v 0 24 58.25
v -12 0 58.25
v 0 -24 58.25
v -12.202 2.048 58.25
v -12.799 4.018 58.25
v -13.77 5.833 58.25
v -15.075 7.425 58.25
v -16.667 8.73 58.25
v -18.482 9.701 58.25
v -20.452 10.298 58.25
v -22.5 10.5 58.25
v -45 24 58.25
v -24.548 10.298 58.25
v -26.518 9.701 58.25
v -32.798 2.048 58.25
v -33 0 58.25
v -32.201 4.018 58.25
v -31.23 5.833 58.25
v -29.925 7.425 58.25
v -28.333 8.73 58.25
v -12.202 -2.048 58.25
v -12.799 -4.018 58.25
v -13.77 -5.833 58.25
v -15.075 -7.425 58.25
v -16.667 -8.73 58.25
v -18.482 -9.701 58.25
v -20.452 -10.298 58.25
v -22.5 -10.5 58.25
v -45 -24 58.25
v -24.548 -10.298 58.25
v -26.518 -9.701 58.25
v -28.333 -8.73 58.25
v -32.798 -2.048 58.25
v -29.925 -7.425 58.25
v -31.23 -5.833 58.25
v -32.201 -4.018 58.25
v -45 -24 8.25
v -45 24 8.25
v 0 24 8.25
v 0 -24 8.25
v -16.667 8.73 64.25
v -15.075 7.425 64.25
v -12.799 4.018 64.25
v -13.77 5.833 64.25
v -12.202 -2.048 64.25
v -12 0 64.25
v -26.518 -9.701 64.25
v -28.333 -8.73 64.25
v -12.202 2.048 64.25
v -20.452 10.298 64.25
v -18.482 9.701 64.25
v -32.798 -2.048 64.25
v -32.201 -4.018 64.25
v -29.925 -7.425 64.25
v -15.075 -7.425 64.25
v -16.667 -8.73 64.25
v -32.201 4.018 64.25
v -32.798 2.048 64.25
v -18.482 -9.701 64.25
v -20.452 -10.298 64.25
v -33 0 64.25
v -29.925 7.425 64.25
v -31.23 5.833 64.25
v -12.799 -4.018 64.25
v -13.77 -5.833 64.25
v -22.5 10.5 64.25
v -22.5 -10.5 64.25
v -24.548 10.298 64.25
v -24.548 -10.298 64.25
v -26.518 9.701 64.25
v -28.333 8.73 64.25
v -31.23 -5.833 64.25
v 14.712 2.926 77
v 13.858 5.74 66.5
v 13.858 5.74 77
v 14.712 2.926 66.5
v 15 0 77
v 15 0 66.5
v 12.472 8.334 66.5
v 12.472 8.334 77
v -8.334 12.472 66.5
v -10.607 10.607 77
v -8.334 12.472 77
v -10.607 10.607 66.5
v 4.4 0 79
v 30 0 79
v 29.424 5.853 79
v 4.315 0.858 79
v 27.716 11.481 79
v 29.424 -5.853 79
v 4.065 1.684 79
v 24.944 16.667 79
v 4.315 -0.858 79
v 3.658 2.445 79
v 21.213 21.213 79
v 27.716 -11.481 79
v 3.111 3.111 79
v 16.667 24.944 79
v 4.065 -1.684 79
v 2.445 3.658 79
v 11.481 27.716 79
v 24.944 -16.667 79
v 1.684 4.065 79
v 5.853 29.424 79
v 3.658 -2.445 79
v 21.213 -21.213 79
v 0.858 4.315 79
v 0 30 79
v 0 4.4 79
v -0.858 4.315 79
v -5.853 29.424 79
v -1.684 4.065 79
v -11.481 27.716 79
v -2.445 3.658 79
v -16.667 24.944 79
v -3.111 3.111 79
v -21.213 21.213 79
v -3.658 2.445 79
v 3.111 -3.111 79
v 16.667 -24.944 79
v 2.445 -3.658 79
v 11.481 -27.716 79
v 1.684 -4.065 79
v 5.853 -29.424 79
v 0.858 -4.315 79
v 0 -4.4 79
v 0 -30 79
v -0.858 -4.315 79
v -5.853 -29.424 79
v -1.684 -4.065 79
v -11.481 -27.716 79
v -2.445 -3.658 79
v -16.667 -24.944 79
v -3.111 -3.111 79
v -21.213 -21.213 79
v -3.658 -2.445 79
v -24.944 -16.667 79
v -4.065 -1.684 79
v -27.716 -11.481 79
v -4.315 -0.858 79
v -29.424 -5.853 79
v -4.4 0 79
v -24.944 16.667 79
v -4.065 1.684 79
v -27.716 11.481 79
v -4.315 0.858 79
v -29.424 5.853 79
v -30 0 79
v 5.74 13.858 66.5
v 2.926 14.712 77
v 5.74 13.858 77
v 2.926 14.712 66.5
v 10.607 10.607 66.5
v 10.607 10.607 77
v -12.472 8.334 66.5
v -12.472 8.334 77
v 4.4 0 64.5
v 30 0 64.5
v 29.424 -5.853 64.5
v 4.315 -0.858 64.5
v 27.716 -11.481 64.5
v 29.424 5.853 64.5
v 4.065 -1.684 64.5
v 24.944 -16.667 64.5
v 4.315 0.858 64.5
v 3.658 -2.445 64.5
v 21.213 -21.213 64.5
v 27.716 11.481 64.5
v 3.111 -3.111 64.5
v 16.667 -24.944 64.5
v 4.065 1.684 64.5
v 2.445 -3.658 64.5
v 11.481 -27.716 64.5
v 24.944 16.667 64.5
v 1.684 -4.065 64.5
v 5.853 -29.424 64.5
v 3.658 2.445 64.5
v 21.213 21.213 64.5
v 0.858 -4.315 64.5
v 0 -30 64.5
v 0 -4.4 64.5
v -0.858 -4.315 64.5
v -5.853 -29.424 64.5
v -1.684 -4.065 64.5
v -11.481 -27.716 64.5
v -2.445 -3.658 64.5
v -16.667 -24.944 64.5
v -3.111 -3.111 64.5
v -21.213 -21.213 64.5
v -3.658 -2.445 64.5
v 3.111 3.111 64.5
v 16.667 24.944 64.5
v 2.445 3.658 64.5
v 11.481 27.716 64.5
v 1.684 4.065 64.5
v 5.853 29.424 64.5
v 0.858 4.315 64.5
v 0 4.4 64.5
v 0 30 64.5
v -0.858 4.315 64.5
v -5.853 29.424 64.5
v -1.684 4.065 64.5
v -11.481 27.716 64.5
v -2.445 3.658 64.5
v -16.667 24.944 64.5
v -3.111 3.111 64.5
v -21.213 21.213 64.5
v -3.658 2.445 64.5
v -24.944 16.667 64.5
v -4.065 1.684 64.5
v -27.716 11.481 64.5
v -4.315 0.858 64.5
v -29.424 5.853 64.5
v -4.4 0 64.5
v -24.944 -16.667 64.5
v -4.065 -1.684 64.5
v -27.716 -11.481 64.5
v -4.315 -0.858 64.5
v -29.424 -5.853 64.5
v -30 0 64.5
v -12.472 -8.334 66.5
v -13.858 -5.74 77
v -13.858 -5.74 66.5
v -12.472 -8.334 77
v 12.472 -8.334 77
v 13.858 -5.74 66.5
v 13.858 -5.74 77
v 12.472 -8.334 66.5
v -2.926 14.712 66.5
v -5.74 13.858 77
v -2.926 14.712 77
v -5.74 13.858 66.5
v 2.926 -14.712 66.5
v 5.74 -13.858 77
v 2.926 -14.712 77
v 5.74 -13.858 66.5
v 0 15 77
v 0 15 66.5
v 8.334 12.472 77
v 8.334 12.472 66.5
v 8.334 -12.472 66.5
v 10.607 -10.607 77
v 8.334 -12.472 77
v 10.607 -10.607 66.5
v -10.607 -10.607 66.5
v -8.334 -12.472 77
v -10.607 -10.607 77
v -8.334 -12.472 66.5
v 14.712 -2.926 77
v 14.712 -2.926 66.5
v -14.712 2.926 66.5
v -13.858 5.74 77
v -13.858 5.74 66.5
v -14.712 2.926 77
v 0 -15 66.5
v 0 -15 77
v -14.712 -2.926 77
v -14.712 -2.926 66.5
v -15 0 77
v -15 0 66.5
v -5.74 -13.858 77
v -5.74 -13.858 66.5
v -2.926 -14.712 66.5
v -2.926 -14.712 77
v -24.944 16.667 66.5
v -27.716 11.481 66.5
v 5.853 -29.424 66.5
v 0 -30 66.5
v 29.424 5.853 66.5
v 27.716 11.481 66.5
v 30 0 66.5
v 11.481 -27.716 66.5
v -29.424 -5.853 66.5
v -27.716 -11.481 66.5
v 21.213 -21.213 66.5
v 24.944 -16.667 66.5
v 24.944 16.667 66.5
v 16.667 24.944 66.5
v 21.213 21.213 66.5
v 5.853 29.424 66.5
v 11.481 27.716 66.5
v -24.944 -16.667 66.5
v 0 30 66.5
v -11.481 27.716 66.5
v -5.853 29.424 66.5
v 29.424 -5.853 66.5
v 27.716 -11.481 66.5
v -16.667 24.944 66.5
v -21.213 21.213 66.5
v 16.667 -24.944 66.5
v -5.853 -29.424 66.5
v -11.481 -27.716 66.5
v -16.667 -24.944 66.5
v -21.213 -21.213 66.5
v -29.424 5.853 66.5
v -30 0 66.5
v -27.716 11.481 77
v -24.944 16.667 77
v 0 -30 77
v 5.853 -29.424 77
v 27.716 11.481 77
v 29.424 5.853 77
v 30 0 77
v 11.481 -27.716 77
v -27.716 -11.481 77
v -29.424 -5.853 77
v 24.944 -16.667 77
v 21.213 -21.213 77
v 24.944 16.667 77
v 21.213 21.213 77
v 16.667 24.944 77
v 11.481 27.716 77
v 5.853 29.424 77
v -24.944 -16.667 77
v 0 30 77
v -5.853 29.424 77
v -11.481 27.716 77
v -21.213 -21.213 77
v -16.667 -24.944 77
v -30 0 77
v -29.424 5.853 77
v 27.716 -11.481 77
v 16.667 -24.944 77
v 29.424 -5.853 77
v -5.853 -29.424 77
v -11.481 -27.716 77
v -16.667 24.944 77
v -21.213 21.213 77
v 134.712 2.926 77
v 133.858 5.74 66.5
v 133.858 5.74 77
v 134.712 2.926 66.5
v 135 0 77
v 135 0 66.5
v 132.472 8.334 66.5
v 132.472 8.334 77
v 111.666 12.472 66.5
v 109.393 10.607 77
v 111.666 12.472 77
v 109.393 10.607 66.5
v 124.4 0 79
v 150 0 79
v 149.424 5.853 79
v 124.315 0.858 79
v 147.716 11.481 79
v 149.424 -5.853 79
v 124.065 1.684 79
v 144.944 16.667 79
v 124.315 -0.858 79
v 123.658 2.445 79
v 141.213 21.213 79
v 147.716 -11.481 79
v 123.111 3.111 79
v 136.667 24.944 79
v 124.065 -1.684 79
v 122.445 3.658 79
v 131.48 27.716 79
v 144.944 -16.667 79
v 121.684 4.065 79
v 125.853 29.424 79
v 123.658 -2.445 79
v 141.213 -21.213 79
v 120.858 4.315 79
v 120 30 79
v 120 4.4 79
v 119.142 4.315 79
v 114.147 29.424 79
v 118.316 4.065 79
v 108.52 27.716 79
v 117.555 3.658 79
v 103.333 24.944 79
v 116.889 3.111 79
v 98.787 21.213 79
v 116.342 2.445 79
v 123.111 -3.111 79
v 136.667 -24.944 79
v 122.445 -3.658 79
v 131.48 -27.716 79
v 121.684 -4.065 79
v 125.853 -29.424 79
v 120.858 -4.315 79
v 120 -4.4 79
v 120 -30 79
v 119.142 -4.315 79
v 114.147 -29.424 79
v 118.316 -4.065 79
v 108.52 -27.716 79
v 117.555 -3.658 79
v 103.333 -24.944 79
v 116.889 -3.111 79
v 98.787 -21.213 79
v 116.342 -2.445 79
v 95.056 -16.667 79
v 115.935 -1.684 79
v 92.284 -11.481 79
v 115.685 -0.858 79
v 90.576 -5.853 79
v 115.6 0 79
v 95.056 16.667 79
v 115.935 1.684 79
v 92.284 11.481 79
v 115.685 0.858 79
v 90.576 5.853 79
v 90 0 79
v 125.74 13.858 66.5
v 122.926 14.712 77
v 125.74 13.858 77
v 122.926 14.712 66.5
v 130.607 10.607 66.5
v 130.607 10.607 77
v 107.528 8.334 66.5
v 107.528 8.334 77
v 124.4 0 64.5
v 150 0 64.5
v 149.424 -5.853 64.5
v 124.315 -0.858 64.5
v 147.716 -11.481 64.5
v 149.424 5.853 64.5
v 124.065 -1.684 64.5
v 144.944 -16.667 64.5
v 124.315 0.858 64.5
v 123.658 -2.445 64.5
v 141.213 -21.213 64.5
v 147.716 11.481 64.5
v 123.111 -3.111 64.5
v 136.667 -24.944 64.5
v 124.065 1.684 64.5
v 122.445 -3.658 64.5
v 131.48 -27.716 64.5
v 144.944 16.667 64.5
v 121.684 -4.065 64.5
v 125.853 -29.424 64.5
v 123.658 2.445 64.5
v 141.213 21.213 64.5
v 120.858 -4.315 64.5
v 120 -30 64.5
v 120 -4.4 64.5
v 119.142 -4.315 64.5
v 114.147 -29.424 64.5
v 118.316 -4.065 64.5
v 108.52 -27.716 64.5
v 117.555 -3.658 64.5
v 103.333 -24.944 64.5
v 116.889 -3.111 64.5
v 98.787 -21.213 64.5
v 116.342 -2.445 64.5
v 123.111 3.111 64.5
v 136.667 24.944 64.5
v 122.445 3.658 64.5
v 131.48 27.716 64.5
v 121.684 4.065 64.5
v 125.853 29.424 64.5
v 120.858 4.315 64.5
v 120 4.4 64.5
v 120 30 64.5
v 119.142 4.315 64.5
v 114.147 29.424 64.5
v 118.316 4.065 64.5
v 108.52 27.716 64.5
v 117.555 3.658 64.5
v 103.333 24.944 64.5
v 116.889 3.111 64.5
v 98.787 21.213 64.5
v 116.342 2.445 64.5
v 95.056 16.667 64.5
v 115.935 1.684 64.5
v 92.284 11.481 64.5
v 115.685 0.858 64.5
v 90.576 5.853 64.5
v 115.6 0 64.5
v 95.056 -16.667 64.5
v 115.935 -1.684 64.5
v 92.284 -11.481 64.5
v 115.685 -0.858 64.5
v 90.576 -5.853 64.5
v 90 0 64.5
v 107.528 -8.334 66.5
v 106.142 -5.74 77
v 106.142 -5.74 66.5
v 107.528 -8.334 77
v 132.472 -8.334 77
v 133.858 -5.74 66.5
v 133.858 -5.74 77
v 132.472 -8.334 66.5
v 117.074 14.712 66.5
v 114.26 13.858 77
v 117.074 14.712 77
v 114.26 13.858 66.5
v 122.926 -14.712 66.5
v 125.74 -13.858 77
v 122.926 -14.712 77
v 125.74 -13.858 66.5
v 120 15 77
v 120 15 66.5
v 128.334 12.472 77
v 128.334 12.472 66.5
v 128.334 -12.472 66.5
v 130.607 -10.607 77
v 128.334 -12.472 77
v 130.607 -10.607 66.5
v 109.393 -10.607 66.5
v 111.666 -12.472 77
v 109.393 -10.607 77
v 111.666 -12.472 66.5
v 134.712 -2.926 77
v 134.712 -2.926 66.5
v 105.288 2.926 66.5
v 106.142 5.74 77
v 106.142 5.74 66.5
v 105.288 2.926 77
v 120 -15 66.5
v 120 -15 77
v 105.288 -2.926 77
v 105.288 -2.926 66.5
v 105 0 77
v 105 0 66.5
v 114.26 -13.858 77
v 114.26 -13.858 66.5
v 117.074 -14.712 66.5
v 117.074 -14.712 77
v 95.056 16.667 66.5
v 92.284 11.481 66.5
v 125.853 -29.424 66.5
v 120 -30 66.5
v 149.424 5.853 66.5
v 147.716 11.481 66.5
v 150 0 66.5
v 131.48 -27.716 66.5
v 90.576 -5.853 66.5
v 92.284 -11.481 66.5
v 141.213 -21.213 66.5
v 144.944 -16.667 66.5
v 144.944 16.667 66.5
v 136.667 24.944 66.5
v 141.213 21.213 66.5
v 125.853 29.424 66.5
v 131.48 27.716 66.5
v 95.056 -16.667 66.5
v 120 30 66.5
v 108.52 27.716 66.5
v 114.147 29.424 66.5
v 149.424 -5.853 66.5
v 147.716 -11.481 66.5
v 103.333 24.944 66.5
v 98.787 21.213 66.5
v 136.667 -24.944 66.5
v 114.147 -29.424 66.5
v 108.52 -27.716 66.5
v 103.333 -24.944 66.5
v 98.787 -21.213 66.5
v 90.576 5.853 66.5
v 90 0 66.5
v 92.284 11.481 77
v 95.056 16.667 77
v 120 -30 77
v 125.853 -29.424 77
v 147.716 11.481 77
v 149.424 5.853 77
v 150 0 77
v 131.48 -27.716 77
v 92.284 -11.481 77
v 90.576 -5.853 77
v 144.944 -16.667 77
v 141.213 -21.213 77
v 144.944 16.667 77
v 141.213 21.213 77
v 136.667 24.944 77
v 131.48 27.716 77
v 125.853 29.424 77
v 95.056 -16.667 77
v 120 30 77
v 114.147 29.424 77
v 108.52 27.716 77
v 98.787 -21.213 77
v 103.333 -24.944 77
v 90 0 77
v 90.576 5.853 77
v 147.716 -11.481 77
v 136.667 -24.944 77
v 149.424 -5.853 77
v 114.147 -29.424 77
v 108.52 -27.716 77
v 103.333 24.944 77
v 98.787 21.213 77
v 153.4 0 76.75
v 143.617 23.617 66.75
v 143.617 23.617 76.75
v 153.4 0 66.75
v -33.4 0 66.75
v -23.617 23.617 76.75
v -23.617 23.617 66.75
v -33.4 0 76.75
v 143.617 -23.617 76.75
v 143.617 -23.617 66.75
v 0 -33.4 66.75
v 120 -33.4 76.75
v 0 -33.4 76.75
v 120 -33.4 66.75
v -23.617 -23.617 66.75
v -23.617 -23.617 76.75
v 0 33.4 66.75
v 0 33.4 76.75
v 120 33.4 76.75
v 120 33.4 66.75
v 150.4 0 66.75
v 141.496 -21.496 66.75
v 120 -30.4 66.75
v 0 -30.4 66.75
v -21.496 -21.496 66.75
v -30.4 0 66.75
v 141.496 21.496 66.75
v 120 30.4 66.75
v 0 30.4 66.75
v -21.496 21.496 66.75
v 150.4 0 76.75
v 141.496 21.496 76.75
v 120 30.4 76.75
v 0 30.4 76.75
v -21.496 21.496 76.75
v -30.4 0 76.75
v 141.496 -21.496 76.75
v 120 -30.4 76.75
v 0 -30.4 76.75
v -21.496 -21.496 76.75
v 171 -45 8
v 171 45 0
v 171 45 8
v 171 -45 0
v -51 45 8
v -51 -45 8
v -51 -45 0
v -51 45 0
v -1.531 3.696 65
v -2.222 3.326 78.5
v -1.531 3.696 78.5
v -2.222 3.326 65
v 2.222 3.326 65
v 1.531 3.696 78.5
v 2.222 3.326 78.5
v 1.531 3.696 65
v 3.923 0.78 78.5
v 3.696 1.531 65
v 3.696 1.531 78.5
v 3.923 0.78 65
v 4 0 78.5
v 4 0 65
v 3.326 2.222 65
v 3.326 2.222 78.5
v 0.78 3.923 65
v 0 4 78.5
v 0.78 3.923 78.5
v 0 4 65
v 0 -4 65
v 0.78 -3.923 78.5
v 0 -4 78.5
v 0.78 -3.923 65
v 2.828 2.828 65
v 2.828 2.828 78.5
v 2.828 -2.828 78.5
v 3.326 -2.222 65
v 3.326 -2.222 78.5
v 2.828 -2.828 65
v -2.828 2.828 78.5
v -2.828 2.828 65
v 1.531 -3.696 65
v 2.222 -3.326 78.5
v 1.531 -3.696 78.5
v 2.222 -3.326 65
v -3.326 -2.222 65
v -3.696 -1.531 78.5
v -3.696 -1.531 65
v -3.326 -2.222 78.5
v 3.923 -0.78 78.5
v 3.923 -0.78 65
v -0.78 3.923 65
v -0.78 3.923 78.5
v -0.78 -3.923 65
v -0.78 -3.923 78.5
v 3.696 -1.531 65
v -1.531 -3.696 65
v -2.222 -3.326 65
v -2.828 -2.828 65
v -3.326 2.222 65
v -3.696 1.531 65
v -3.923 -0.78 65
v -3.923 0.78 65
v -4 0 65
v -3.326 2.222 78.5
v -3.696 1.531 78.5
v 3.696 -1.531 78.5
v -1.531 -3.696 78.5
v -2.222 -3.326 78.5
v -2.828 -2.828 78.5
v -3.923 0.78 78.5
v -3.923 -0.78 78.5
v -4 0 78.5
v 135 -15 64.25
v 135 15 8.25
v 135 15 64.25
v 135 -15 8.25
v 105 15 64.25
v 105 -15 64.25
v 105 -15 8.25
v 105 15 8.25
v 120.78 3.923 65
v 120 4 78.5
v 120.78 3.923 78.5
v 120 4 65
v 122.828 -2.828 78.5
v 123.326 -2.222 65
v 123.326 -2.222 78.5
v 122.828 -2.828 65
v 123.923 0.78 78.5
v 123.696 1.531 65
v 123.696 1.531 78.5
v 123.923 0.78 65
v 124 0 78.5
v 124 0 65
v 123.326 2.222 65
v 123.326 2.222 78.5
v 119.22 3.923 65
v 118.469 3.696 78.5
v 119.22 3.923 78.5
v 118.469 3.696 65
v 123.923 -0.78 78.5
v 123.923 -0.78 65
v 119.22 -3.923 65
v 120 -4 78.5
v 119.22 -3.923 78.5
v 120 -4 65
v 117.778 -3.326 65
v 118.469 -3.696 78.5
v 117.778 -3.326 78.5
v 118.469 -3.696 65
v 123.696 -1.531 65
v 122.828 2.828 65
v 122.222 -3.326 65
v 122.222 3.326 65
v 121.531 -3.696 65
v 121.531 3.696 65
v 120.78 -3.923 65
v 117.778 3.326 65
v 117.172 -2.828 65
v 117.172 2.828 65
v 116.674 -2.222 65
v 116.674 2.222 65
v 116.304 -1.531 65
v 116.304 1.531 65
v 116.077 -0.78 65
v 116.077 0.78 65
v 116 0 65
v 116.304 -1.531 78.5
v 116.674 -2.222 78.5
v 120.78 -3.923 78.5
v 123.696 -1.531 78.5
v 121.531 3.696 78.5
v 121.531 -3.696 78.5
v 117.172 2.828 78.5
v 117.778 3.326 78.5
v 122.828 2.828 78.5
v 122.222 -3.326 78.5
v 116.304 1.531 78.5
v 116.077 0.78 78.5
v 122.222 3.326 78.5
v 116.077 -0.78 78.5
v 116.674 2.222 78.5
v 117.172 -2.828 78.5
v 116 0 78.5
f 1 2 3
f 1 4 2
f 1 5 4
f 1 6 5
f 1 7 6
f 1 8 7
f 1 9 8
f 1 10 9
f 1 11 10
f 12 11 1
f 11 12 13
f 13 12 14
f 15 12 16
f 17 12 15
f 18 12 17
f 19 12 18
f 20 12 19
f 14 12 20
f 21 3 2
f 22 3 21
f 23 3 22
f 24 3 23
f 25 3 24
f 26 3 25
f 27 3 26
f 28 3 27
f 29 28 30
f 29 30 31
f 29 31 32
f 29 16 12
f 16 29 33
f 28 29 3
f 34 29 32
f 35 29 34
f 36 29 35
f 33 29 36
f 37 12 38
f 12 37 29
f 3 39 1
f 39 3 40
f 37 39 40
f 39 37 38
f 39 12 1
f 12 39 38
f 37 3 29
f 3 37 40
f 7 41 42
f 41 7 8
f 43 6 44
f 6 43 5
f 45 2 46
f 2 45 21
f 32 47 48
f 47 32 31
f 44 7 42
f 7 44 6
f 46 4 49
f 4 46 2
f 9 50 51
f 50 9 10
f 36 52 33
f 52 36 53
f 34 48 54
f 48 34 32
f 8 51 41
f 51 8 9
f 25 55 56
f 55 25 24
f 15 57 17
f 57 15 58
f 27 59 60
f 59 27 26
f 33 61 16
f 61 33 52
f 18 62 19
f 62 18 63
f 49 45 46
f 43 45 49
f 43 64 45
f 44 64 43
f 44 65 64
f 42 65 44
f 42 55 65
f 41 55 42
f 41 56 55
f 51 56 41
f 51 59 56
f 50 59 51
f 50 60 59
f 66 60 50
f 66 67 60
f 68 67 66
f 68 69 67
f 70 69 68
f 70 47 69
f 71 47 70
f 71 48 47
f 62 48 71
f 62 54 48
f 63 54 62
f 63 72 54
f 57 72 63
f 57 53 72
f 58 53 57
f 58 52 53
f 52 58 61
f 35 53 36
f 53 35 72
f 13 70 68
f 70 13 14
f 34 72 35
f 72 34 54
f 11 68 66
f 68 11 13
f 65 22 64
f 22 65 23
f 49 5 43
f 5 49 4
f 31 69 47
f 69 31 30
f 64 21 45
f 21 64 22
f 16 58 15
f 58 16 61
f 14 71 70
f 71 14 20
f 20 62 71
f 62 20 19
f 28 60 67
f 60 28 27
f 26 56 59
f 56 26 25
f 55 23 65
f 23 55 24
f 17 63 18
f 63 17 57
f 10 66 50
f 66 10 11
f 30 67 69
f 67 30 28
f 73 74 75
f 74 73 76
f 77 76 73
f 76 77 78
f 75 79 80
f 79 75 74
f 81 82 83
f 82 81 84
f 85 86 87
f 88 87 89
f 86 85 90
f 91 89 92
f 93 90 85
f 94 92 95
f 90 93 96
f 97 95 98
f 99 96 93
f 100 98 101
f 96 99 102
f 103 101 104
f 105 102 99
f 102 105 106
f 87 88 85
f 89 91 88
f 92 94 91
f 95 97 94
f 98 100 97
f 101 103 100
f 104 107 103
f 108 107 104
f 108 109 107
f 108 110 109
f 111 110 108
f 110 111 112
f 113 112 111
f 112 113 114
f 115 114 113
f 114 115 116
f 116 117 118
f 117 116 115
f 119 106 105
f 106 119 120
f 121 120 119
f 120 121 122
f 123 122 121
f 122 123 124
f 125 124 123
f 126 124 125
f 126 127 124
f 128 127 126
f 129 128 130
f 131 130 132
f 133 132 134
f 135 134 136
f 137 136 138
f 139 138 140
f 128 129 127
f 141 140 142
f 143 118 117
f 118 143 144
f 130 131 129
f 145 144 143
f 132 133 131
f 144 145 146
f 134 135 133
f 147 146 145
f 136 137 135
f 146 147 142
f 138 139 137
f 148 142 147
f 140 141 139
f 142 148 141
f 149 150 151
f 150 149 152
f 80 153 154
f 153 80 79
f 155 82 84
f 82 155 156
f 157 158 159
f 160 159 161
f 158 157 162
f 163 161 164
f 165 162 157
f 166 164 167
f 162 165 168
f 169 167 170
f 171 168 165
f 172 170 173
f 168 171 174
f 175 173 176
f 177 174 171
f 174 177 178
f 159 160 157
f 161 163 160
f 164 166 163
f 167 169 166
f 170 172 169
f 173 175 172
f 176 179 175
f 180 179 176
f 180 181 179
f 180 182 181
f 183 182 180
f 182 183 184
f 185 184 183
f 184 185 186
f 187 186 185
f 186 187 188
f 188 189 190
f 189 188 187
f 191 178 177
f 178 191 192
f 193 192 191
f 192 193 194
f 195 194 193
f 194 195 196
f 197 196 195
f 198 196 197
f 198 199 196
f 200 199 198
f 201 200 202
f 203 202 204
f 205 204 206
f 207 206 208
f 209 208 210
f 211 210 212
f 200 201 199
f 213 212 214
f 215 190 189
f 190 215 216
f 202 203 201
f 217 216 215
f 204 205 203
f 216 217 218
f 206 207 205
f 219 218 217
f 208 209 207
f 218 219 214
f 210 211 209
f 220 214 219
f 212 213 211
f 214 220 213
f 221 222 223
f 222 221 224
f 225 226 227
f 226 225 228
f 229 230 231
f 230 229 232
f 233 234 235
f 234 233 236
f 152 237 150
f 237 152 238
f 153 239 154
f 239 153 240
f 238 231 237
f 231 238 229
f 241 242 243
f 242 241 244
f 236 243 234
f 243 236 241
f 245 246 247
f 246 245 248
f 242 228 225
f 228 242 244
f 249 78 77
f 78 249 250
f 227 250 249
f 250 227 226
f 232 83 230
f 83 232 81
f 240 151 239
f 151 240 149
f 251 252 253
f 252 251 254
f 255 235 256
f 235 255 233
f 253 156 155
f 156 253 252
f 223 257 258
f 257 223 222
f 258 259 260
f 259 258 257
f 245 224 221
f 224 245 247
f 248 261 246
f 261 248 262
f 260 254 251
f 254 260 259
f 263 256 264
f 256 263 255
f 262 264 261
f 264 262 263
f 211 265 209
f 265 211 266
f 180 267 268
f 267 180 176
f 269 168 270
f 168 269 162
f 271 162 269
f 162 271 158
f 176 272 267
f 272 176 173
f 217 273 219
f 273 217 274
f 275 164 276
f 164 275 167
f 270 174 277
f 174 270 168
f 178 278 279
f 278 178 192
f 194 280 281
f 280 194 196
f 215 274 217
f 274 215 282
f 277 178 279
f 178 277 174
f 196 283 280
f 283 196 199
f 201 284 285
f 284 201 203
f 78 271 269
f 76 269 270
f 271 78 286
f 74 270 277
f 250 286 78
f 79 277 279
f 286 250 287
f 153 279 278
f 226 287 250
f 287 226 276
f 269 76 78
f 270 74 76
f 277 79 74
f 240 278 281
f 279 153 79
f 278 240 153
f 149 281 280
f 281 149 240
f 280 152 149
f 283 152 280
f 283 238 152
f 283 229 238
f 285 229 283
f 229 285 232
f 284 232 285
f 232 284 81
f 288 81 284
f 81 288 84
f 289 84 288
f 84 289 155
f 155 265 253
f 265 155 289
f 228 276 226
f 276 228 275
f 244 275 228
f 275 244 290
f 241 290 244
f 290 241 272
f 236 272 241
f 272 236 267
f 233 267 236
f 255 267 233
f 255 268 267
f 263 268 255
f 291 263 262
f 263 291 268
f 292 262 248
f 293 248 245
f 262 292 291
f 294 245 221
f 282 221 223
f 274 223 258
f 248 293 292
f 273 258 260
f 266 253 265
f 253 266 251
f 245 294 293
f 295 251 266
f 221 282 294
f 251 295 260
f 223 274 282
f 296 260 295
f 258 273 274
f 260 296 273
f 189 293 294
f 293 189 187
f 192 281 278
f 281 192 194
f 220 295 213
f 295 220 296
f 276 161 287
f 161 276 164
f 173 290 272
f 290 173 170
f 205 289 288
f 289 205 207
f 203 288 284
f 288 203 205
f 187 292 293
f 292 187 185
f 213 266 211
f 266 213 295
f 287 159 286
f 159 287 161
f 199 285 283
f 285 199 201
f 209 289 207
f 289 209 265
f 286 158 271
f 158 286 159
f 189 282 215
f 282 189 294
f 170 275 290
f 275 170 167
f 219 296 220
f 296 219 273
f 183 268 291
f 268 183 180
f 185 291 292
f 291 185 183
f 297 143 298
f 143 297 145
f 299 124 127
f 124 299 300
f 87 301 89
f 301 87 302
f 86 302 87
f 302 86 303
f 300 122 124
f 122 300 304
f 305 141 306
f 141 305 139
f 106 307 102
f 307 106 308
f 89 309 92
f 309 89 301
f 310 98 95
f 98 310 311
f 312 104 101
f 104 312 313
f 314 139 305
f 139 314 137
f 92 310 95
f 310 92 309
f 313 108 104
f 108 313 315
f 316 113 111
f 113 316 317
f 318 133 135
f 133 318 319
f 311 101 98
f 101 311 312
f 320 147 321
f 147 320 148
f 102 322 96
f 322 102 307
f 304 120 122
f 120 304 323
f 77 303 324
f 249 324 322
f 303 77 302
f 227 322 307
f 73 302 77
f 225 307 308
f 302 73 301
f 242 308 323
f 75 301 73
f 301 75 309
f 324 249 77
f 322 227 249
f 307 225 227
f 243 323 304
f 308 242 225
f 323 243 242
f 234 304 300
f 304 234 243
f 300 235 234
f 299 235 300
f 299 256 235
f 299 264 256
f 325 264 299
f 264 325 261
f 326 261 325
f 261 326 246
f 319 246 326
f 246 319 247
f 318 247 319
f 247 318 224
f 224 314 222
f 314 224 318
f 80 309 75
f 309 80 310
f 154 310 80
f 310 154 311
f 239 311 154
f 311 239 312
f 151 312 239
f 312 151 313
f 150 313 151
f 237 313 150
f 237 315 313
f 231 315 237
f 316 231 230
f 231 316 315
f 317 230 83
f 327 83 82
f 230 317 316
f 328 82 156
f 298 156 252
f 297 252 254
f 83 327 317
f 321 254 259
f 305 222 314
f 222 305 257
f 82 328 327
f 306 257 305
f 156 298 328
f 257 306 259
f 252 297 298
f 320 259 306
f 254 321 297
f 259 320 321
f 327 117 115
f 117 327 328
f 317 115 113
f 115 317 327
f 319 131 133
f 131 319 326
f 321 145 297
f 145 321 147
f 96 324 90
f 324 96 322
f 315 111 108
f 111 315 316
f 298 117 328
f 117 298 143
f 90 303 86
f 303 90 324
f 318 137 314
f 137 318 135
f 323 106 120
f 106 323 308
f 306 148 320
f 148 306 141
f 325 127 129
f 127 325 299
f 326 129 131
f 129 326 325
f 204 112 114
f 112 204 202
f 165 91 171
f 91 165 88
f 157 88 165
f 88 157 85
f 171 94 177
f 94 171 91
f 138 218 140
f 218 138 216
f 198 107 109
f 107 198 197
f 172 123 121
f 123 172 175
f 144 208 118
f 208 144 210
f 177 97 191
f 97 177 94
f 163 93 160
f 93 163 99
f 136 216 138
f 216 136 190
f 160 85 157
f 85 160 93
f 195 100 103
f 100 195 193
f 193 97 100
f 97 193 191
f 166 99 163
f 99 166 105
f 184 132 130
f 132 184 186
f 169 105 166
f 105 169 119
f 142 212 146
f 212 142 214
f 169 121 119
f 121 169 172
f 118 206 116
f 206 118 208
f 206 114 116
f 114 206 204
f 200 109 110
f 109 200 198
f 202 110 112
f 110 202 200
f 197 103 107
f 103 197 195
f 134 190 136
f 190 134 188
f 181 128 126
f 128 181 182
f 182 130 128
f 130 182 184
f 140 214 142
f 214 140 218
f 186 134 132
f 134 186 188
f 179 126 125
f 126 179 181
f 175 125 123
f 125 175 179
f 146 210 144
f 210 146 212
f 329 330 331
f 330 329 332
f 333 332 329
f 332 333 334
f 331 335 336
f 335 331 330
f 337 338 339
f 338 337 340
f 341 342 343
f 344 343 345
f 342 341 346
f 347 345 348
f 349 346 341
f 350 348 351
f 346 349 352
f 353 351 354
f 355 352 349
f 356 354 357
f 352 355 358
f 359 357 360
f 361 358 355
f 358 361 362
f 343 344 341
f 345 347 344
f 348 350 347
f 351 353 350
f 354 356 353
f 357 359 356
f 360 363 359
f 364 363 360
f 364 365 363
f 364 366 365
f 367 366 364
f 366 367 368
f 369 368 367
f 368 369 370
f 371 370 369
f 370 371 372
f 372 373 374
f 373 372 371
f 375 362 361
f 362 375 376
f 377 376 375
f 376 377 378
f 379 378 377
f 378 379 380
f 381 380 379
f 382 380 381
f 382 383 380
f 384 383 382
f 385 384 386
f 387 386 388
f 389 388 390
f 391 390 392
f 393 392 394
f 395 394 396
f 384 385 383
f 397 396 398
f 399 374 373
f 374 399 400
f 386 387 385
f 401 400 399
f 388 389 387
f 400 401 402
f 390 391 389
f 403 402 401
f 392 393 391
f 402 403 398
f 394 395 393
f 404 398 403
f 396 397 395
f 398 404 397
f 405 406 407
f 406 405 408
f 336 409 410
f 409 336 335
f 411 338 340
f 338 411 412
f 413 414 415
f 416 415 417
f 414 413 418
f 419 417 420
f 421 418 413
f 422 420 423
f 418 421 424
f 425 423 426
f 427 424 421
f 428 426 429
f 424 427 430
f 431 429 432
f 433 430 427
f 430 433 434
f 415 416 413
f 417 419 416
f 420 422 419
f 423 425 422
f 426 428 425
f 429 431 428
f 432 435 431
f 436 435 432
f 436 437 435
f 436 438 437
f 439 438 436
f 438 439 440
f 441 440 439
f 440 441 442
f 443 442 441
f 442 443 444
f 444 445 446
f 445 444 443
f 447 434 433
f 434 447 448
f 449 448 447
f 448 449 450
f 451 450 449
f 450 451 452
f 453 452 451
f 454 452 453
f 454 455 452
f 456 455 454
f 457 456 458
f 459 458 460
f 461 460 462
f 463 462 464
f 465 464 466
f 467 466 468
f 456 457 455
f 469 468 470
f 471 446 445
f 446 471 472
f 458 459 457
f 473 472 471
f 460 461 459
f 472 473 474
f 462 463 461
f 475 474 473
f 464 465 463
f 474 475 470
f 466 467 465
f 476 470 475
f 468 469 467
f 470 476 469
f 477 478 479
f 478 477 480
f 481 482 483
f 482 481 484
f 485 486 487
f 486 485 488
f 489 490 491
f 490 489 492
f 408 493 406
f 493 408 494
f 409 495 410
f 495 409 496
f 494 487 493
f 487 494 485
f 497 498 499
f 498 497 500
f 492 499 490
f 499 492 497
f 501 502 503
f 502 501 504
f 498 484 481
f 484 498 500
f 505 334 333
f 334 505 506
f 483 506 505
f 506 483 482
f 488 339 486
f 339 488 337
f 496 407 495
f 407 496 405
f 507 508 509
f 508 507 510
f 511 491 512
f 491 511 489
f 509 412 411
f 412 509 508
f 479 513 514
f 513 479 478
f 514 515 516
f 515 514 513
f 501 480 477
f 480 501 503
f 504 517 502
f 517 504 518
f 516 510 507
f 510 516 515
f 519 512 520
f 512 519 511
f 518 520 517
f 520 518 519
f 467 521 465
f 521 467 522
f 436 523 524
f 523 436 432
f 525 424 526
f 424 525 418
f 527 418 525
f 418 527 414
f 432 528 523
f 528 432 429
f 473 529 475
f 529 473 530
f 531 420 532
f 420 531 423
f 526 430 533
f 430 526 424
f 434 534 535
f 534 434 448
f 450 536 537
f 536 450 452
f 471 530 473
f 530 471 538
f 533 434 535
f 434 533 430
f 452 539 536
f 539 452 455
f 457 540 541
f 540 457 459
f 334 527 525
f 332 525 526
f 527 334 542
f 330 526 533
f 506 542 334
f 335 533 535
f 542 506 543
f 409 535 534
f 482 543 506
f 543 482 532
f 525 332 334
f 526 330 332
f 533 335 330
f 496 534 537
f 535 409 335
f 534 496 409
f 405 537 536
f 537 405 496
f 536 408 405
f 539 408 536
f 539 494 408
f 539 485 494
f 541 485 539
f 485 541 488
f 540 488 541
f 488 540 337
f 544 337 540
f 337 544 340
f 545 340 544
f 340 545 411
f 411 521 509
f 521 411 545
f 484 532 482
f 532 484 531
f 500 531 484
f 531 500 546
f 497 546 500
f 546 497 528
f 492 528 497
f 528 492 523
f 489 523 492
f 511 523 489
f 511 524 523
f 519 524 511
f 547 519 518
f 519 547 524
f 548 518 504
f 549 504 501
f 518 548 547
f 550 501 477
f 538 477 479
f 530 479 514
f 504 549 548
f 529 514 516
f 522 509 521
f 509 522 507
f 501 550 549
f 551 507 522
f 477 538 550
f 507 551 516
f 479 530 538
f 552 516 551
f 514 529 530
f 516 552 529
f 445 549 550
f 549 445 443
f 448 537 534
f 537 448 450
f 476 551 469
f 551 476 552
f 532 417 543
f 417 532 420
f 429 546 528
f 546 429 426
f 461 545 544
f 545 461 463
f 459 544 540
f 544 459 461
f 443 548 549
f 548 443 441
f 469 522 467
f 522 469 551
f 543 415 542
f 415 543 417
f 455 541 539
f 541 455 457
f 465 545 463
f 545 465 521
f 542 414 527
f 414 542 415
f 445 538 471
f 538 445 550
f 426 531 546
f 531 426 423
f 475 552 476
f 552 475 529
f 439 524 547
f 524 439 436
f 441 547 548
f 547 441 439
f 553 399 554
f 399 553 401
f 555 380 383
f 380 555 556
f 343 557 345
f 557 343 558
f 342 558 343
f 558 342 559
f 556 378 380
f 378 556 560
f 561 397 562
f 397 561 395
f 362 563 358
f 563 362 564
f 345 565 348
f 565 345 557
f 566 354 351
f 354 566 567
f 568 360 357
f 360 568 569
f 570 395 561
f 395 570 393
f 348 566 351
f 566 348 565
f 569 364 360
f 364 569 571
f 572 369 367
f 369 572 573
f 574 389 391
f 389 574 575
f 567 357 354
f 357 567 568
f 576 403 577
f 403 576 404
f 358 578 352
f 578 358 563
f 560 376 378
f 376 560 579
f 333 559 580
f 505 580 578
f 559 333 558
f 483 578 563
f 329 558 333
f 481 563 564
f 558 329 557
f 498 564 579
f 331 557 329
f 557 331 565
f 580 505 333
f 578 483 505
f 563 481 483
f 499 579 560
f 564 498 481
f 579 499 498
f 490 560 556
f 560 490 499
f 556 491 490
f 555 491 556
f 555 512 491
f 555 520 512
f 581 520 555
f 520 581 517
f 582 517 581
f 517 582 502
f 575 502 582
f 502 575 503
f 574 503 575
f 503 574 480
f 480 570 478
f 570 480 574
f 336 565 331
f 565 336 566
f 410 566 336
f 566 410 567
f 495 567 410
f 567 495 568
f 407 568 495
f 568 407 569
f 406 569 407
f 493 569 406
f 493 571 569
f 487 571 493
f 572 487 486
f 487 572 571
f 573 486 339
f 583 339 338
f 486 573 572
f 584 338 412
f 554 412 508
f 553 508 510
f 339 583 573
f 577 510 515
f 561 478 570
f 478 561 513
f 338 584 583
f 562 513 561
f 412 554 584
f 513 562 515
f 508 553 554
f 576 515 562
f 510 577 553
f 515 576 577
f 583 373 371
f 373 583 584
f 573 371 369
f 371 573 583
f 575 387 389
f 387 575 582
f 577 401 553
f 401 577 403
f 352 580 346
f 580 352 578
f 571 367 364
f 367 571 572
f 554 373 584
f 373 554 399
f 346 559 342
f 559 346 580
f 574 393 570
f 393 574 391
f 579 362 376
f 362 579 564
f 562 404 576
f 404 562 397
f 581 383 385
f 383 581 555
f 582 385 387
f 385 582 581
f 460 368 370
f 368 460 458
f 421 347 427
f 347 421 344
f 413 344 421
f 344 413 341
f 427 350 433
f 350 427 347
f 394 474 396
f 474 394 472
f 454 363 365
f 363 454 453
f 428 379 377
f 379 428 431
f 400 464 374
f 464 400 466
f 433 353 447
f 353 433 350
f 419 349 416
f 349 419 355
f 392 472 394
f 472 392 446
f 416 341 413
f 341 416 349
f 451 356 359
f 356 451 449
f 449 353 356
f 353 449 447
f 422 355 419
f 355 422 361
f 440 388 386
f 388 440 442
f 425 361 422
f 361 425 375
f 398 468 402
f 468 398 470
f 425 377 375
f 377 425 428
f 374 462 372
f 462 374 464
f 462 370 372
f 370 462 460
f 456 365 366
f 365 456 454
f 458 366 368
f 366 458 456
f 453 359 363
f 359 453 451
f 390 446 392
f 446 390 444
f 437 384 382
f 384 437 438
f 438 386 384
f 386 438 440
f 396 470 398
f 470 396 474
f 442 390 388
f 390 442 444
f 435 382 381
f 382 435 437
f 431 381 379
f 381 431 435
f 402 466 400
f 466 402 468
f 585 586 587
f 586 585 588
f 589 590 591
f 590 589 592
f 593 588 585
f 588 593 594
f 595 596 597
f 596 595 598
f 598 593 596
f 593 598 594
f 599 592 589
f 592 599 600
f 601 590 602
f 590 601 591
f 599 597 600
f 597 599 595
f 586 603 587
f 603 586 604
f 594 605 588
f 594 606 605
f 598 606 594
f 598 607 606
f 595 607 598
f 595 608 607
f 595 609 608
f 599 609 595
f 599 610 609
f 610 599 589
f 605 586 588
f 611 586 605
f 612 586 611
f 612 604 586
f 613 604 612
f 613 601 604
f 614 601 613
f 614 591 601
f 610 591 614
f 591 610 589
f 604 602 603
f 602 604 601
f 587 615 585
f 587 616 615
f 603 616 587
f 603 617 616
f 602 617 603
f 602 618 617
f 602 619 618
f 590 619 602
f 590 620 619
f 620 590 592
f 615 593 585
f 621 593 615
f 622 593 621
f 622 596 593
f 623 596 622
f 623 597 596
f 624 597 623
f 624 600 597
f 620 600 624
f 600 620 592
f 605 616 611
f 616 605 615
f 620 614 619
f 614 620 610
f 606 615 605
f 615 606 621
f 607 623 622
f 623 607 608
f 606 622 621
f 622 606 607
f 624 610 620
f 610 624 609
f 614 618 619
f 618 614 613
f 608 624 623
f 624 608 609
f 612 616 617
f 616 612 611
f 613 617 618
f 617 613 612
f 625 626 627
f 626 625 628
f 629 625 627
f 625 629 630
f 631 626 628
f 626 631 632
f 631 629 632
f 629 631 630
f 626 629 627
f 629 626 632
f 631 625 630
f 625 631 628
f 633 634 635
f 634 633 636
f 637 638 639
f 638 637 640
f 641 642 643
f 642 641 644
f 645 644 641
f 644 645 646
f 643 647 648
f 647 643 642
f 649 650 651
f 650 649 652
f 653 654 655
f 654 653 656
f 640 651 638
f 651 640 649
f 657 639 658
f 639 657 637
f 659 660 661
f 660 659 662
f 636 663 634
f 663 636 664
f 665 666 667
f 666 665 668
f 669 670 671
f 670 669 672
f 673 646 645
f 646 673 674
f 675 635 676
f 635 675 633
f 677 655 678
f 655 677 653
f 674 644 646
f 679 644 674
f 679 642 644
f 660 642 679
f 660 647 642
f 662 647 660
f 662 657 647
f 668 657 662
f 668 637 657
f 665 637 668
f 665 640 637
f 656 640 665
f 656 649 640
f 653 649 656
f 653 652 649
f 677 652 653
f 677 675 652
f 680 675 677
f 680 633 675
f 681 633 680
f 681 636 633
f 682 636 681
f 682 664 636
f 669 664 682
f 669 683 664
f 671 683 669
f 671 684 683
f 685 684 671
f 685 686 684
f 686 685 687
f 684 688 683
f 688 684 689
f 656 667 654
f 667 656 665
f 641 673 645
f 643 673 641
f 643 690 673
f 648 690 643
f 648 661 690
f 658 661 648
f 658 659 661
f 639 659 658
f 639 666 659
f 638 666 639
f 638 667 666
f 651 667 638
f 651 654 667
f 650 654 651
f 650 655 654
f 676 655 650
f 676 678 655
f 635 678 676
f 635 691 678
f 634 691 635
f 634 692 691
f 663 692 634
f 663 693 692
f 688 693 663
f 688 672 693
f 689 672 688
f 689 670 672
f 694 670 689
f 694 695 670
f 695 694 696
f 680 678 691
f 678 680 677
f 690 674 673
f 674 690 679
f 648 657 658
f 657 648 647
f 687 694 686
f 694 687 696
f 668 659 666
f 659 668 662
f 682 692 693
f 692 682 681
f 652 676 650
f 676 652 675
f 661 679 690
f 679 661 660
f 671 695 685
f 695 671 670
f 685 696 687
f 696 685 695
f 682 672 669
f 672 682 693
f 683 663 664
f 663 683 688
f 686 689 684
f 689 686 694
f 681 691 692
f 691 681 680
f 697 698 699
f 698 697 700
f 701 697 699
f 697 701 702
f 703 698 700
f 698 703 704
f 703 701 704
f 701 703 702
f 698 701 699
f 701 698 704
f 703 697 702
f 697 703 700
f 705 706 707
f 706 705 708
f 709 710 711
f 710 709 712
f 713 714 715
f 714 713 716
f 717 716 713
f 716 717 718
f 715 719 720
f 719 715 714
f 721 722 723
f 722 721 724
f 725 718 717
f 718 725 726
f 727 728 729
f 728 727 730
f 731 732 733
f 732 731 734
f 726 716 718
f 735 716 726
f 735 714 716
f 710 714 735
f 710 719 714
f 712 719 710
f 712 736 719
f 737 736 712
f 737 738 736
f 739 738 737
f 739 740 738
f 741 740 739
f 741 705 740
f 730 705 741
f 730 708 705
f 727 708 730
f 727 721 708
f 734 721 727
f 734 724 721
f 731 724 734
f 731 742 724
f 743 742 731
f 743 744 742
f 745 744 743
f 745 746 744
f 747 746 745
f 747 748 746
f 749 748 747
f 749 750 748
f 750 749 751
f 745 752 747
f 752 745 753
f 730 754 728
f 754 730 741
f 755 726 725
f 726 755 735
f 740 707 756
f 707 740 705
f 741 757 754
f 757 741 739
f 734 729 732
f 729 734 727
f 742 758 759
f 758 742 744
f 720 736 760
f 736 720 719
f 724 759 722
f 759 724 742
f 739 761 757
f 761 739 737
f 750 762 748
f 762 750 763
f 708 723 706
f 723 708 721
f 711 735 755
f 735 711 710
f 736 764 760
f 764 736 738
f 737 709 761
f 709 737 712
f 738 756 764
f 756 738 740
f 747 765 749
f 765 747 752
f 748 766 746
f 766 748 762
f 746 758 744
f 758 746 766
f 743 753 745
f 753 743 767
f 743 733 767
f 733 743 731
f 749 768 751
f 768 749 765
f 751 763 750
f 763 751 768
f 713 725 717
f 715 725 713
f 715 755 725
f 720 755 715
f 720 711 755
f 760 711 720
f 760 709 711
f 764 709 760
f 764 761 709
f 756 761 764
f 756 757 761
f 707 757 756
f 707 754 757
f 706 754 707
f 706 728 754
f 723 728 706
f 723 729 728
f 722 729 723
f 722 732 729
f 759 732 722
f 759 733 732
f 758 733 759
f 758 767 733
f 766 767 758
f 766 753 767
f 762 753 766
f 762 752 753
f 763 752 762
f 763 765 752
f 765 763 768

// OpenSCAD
$fn = 32;

// ------------------------------------------------------------------------
// Motor belt drive: span 120 mm, pulleys d60, belt 10 mm wide
// Every part is its own module, assembly() places every instance.
// ------------------------------------------------------------------------

// --- part 1 ---
module base_plate() {
  difference() {
    translate([-111, -45, 0]) cube([222, 90, 8]);
  }
}

// --- part 2 ---
module motor() {
  union() {
    translate([-25, -24, 0]) cube([50, 48, 45]);
    translate([28, 0, 22.5]) rotate([0, 90, 0]) cylinder(h = 6, d = 21, center = true);
  }
}

// --- part 3 ---
module drive_shaft() {
  translate([0, 0, -6.75]) cylinder(h = 13.5, d = 8);
}

// --- part 4 ---
module pulley_drive() {
  difference() {
    union() {
      cylinder(h = 14.5, d = 30);
      cylinder(h = 2, d = 60);
      translate([0, 0, 12.5]) cylinder(h = 2, d = 60);
    }
    translate([0, 0, -1]) cylinder(h = 16.5, d = 8.8);
  }
}

// --- part 5 ---
module idler_post() {
  translate([-15, -15, 0]) cube([30, 30, 56]);
}

// --- part 6 ---
module driven_shaft() {
  translate([0, 0, -6.75]) cylinder(h = 13.5, d = 8);
}

// --- part 7 ---
module pulley_driven() {
  difference() {
    union() {
      cylinder(h = 14.5, d = 30);
      cylinder(h = 2, d = 60);
      translate([0, 0, 12.5]) cylinder(h = 2, d = 60);
    }
    translate([0, 0, -1]) cylinder(h = 16.5, d = 8.8);
  }
}

// --- part 8 ---
module drive_belt() {
  difference() {
    linear_extrude(height = 10) polygon(points = concat([for (a = [90 : 45 : 270]) [33.4 * cos(a), 33.4 * sin(a)]], [for (a = [270 : 45 : 450]) [120 + 33.4 * cos(a), 33.4 * sin(a)]]));
    translate([0, 0, -1]) linear_extrude(height = 12) polygon(points = concat([for (a = [90 : 45 : 270]) [30.4 * cos(a), 30.4 * sin(a)]], [for (a = [270 : 45 : 450]) [120 + 30.4 * cos(a), 30.4 * sin(a)]]));
  }
}

// --- assembly ---
module assembly() {
  color([0.80, 0.24, 0.20]) translate([60, 0, 0]) rotate([0, 0, 0]) base_plate();
  color([0.20, 0.45, 0.75]) translate([0, 0, 33.25]) rotate([0, 270, 0]) motor();
  color([0.25, 0.62, 0.32]) translate([0, 0, 71.75]) rotate([0, 0, 0]) drive_shaft();
  color([0.92, 0.70, 0.18]) translate([0, 0, 64.5]) rotate([0, 0, 0]) pulley_drive();
  color([0.58, 0.35, 0.70]) translate([120, 0, 8.25]) rotate([0, 0, 0]) idler_post();
  color([0.16, 0.66, 0.66]) translate([120, 0, 71.75]) rotate([0, 0, 0]) driven_shaft();
  color([0.85, 0.48, 0.18]) translate([120, 0, 64.5]) rotate([0, 0, 0]) pulley_driven();
  color([0.55, 0.60, 0.65]) translate([0, 0, 66.75]) rotate([0, 0, 0]) drive_belt();
}

assembly();
